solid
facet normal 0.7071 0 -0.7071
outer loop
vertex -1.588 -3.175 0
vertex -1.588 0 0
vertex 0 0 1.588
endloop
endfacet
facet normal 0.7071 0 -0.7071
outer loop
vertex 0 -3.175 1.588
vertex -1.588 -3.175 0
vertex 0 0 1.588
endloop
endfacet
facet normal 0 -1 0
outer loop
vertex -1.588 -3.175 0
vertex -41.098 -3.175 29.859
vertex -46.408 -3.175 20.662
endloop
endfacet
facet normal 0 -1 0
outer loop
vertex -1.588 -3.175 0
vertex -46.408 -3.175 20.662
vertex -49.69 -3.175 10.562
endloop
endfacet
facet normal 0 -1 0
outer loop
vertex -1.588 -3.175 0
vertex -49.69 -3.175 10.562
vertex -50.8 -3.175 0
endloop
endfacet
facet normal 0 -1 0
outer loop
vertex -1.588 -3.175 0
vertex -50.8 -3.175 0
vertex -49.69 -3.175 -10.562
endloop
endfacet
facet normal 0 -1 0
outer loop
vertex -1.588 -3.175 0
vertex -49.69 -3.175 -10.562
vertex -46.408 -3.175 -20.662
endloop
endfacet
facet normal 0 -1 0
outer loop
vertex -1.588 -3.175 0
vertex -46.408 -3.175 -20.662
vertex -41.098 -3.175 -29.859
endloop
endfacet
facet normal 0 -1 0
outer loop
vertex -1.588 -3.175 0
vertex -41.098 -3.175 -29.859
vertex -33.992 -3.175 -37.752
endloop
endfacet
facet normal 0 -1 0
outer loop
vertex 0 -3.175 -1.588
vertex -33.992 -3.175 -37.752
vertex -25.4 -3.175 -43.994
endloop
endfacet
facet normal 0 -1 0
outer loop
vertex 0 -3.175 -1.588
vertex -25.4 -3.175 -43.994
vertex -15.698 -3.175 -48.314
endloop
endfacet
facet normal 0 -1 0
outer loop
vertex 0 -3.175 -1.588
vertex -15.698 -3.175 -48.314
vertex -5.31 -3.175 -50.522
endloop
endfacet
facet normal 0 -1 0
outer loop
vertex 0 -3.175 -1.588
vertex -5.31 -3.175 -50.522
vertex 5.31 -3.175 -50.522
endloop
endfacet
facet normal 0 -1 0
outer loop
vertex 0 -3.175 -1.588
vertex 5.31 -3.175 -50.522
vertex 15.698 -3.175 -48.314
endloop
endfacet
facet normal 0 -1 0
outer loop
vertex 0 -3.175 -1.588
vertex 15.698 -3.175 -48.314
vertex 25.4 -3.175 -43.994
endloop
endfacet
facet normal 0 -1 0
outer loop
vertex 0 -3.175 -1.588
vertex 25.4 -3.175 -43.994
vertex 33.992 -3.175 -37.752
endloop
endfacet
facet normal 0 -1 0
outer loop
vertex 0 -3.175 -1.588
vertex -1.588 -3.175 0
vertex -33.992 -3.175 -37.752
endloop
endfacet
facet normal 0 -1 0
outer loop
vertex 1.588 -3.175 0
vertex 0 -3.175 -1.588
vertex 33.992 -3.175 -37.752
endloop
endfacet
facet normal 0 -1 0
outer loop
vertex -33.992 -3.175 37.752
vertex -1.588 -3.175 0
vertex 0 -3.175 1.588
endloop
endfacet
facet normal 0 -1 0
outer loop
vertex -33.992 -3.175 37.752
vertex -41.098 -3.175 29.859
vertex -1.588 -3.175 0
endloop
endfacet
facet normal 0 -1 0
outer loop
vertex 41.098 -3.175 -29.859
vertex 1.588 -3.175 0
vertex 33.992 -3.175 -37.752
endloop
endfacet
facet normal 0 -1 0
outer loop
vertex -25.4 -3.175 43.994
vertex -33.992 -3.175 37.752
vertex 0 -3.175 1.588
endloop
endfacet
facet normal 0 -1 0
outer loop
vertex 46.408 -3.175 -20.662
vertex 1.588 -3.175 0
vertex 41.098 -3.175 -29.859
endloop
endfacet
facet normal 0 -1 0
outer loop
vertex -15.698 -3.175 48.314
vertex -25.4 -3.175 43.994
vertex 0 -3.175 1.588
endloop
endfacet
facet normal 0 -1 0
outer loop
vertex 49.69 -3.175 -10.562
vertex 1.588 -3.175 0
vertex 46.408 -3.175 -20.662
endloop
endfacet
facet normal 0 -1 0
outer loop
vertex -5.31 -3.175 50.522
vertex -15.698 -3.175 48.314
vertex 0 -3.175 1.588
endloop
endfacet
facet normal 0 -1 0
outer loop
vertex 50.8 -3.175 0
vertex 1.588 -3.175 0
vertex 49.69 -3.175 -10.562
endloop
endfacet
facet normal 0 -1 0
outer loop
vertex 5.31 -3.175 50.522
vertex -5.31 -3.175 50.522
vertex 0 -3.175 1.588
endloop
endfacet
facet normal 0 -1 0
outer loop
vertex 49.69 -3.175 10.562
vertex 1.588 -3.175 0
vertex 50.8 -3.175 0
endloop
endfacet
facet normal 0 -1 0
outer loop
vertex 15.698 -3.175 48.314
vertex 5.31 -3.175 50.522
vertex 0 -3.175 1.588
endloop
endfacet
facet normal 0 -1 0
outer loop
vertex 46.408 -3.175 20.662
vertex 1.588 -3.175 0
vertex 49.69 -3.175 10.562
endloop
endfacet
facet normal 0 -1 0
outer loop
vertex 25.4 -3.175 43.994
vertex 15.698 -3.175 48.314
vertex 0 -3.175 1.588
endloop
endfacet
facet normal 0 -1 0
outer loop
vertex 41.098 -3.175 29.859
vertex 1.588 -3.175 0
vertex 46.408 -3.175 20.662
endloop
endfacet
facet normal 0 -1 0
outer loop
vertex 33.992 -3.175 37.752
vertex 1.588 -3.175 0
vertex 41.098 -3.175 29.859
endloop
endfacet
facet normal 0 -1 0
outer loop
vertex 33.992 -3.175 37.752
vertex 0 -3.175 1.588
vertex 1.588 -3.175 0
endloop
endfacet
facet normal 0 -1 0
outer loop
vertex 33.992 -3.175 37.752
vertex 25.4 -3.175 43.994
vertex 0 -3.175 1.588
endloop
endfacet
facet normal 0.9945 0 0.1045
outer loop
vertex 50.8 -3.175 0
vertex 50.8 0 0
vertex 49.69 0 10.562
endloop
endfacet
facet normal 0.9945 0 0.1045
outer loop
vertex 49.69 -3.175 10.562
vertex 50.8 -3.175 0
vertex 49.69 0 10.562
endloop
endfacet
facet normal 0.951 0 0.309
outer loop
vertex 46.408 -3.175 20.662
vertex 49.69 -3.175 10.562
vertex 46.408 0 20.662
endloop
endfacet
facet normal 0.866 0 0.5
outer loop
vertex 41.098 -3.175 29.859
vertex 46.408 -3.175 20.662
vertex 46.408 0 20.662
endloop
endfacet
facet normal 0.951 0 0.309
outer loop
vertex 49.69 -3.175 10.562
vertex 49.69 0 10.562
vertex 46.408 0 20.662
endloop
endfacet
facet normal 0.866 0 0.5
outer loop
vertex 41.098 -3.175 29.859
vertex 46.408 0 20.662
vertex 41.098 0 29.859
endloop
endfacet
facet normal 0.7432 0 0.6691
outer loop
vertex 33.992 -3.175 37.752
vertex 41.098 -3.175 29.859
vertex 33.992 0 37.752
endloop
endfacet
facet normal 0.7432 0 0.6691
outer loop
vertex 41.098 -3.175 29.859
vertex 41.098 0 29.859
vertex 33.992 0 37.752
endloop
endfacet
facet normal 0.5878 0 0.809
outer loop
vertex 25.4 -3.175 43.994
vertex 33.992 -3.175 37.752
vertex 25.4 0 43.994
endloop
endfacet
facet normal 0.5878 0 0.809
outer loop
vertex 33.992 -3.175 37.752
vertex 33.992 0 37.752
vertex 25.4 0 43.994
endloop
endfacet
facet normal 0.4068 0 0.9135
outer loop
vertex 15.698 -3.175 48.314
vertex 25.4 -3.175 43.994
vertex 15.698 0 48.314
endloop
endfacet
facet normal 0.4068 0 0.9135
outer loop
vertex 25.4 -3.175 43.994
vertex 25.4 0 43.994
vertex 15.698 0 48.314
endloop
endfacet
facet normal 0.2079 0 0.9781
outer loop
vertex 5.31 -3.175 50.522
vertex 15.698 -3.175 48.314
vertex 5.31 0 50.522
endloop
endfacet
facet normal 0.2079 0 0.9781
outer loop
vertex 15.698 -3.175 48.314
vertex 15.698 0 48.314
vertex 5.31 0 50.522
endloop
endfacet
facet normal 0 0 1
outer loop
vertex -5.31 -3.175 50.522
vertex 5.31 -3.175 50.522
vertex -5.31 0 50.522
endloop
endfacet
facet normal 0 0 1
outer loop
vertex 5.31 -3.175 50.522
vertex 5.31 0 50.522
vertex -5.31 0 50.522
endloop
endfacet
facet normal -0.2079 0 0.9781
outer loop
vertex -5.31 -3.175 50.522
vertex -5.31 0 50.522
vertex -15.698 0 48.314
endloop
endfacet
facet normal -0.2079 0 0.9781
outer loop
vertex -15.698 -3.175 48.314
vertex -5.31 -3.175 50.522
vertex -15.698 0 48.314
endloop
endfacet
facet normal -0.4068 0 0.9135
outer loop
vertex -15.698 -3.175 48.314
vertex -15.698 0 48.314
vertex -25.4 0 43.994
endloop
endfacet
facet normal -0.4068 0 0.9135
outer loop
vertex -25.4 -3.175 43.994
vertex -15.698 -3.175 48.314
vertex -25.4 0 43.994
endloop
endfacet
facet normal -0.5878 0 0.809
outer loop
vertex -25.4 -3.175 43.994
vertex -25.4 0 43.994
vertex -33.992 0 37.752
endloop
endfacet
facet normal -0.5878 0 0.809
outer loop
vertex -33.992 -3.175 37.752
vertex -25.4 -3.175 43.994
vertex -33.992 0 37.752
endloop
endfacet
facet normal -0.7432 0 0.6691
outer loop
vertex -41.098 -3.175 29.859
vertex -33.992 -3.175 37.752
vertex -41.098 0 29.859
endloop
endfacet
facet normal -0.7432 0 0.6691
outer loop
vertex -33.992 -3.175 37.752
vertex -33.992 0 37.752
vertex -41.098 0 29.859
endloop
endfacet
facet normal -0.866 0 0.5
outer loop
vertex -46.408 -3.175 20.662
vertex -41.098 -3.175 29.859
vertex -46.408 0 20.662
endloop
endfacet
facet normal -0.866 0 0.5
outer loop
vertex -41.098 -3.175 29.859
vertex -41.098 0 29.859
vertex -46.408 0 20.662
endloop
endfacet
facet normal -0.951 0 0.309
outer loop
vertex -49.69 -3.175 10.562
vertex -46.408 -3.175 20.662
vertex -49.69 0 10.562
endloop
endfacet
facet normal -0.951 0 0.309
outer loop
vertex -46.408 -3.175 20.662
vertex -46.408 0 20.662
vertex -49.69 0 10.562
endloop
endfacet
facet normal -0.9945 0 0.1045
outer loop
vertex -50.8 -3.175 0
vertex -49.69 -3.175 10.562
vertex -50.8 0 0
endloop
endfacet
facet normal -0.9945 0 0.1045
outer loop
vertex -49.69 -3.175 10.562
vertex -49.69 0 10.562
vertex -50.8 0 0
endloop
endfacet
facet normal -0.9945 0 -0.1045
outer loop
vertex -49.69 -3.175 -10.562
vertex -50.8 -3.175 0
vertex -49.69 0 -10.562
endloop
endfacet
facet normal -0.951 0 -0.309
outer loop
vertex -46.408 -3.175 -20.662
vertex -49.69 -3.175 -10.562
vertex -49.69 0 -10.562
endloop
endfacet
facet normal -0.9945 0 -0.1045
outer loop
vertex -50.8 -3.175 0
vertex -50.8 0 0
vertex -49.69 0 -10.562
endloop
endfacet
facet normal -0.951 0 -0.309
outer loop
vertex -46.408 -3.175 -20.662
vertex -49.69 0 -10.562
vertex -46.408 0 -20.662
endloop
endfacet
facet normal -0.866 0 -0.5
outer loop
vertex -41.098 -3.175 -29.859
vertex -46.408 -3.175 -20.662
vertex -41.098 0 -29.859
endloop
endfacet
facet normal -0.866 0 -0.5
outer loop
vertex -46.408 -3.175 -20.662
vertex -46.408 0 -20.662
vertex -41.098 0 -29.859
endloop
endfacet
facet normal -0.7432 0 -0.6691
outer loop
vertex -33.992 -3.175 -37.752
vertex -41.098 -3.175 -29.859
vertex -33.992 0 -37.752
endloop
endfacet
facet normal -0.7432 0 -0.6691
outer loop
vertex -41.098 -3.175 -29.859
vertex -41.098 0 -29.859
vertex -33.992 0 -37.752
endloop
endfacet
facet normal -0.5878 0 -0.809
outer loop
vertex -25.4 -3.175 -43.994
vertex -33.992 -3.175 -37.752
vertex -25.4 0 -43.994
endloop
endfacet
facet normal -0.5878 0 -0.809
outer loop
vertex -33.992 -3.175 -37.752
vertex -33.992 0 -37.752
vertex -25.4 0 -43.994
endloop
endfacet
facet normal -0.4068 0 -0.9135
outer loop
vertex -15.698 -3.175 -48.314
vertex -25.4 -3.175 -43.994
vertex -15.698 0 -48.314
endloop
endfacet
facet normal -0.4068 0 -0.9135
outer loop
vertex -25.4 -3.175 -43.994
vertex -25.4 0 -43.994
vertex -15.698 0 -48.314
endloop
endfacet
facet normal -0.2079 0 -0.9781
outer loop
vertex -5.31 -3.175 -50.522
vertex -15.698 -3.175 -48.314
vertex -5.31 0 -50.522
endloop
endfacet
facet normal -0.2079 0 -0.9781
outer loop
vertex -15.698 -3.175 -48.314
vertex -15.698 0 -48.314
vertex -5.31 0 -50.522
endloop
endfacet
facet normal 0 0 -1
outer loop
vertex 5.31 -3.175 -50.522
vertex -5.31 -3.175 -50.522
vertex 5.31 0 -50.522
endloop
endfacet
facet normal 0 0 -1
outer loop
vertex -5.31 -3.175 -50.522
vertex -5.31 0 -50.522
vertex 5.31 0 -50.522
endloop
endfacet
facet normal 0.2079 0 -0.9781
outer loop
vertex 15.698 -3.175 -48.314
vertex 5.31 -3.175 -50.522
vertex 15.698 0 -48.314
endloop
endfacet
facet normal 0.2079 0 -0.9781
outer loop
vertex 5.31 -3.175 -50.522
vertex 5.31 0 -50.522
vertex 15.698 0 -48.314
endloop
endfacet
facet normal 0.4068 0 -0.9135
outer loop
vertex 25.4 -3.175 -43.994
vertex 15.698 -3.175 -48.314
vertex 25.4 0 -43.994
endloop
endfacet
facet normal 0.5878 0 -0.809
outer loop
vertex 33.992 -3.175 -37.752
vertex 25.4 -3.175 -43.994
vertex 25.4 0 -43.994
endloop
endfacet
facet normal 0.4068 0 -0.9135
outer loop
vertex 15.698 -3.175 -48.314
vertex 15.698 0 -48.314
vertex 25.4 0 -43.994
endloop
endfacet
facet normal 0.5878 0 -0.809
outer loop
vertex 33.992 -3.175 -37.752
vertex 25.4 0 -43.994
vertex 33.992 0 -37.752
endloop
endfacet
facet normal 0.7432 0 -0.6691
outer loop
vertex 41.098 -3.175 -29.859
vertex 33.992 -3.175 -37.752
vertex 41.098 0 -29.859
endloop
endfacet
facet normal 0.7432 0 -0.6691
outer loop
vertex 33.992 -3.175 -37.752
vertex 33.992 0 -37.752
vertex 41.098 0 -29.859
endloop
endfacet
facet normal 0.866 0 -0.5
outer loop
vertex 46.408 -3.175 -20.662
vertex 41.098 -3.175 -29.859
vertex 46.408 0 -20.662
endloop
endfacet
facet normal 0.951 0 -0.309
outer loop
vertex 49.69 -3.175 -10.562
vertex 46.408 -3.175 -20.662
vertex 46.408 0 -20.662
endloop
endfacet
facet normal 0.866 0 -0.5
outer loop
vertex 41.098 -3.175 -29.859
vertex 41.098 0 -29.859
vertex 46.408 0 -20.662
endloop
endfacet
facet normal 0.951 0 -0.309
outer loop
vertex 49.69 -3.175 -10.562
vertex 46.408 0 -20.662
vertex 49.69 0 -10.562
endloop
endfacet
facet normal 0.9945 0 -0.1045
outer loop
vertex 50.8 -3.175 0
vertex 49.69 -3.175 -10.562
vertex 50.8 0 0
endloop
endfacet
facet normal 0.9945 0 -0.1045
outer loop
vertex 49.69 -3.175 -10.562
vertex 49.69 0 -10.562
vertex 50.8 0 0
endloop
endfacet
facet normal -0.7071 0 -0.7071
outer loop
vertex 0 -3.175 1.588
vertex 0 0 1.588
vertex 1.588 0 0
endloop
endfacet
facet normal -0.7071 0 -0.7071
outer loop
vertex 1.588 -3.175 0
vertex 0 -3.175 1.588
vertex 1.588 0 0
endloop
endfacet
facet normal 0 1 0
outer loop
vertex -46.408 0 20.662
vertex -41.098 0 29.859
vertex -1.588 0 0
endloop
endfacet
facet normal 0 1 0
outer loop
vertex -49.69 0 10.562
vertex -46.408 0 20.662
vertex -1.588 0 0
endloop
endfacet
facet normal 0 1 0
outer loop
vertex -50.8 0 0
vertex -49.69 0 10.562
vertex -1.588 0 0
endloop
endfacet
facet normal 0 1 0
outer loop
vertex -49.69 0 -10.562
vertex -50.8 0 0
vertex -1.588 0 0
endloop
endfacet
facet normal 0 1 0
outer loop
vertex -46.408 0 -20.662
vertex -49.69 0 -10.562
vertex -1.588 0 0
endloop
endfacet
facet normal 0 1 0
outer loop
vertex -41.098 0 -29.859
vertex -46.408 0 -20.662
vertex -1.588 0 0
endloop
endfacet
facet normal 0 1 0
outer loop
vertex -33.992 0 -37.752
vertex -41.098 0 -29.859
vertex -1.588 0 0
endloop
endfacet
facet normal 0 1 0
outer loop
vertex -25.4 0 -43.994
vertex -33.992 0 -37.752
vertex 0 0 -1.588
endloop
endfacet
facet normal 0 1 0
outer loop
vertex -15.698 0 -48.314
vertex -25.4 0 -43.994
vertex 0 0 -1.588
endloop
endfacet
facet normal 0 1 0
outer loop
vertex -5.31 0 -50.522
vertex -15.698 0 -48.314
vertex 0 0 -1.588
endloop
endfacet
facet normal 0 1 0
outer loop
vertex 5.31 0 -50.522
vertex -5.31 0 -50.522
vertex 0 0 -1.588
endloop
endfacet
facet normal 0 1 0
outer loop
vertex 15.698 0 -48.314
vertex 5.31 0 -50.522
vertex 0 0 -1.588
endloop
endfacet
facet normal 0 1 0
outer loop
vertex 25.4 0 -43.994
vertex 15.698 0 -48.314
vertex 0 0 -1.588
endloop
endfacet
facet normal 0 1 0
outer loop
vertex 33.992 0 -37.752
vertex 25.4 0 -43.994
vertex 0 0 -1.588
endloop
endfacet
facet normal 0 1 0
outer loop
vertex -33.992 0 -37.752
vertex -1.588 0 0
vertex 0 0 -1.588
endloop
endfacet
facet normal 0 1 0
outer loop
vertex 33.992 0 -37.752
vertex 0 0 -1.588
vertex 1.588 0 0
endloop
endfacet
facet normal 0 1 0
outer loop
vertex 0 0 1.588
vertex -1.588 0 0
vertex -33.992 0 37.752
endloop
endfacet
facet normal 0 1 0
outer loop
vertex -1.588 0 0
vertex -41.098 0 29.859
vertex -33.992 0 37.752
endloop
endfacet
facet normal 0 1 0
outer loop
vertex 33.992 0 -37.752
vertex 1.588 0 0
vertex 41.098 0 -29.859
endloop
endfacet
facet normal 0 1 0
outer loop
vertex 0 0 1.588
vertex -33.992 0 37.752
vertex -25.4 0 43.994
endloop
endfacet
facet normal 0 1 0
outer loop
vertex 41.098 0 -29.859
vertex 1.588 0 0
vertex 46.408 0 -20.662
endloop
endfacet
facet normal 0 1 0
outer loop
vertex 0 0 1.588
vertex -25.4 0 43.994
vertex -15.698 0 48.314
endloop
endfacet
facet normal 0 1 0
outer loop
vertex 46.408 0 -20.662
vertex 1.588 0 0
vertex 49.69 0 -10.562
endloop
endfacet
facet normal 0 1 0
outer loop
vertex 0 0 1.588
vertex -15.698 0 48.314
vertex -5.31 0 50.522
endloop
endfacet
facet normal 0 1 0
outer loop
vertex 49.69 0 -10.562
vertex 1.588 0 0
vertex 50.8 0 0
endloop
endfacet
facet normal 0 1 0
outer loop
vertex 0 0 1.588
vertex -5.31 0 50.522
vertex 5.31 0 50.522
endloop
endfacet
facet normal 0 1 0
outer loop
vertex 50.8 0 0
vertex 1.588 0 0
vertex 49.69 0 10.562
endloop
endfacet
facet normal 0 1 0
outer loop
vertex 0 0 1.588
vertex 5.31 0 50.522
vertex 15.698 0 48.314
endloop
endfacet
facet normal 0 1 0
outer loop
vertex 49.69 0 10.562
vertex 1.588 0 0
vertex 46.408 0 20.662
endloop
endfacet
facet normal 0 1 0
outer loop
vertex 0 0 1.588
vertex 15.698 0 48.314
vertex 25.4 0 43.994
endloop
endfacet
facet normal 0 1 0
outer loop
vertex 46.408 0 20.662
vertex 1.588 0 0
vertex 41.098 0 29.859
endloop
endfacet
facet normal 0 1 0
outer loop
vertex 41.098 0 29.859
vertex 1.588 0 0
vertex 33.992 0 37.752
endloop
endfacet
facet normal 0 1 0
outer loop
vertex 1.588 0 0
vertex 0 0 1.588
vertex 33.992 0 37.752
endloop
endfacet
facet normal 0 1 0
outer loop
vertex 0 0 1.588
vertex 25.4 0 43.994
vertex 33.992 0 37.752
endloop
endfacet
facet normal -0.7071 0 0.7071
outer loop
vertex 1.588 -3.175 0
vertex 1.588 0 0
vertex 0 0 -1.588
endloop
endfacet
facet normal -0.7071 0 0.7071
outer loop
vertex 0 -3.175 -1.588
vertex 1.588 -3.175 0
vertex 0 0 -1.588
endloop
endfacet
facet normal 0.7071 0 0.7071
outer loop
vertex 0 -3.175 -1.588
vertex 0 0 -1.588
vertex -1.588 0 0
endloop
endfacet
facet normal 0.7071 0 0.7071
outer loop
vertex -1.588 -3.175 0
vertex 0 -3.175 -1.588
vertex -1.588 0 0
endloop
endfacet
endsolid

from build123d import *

# Parameters (mm, degrees)
F0_R     = 50.8
F1_DEPTH = 3.175


with BuildPart() as f1:
    # F0 (on Front) → F1 (new body)
    with BuildSketch(Plane.XZ):
        Circle(F0_R)
        Polygon((-1.5875, 0), (0, 1.5875), (1.5875, 0), (0, -1.5875), align=None, mode=Mode.SUBTRACT)
    extrude(amount=F1_DEPTH)


solid = f1.part
